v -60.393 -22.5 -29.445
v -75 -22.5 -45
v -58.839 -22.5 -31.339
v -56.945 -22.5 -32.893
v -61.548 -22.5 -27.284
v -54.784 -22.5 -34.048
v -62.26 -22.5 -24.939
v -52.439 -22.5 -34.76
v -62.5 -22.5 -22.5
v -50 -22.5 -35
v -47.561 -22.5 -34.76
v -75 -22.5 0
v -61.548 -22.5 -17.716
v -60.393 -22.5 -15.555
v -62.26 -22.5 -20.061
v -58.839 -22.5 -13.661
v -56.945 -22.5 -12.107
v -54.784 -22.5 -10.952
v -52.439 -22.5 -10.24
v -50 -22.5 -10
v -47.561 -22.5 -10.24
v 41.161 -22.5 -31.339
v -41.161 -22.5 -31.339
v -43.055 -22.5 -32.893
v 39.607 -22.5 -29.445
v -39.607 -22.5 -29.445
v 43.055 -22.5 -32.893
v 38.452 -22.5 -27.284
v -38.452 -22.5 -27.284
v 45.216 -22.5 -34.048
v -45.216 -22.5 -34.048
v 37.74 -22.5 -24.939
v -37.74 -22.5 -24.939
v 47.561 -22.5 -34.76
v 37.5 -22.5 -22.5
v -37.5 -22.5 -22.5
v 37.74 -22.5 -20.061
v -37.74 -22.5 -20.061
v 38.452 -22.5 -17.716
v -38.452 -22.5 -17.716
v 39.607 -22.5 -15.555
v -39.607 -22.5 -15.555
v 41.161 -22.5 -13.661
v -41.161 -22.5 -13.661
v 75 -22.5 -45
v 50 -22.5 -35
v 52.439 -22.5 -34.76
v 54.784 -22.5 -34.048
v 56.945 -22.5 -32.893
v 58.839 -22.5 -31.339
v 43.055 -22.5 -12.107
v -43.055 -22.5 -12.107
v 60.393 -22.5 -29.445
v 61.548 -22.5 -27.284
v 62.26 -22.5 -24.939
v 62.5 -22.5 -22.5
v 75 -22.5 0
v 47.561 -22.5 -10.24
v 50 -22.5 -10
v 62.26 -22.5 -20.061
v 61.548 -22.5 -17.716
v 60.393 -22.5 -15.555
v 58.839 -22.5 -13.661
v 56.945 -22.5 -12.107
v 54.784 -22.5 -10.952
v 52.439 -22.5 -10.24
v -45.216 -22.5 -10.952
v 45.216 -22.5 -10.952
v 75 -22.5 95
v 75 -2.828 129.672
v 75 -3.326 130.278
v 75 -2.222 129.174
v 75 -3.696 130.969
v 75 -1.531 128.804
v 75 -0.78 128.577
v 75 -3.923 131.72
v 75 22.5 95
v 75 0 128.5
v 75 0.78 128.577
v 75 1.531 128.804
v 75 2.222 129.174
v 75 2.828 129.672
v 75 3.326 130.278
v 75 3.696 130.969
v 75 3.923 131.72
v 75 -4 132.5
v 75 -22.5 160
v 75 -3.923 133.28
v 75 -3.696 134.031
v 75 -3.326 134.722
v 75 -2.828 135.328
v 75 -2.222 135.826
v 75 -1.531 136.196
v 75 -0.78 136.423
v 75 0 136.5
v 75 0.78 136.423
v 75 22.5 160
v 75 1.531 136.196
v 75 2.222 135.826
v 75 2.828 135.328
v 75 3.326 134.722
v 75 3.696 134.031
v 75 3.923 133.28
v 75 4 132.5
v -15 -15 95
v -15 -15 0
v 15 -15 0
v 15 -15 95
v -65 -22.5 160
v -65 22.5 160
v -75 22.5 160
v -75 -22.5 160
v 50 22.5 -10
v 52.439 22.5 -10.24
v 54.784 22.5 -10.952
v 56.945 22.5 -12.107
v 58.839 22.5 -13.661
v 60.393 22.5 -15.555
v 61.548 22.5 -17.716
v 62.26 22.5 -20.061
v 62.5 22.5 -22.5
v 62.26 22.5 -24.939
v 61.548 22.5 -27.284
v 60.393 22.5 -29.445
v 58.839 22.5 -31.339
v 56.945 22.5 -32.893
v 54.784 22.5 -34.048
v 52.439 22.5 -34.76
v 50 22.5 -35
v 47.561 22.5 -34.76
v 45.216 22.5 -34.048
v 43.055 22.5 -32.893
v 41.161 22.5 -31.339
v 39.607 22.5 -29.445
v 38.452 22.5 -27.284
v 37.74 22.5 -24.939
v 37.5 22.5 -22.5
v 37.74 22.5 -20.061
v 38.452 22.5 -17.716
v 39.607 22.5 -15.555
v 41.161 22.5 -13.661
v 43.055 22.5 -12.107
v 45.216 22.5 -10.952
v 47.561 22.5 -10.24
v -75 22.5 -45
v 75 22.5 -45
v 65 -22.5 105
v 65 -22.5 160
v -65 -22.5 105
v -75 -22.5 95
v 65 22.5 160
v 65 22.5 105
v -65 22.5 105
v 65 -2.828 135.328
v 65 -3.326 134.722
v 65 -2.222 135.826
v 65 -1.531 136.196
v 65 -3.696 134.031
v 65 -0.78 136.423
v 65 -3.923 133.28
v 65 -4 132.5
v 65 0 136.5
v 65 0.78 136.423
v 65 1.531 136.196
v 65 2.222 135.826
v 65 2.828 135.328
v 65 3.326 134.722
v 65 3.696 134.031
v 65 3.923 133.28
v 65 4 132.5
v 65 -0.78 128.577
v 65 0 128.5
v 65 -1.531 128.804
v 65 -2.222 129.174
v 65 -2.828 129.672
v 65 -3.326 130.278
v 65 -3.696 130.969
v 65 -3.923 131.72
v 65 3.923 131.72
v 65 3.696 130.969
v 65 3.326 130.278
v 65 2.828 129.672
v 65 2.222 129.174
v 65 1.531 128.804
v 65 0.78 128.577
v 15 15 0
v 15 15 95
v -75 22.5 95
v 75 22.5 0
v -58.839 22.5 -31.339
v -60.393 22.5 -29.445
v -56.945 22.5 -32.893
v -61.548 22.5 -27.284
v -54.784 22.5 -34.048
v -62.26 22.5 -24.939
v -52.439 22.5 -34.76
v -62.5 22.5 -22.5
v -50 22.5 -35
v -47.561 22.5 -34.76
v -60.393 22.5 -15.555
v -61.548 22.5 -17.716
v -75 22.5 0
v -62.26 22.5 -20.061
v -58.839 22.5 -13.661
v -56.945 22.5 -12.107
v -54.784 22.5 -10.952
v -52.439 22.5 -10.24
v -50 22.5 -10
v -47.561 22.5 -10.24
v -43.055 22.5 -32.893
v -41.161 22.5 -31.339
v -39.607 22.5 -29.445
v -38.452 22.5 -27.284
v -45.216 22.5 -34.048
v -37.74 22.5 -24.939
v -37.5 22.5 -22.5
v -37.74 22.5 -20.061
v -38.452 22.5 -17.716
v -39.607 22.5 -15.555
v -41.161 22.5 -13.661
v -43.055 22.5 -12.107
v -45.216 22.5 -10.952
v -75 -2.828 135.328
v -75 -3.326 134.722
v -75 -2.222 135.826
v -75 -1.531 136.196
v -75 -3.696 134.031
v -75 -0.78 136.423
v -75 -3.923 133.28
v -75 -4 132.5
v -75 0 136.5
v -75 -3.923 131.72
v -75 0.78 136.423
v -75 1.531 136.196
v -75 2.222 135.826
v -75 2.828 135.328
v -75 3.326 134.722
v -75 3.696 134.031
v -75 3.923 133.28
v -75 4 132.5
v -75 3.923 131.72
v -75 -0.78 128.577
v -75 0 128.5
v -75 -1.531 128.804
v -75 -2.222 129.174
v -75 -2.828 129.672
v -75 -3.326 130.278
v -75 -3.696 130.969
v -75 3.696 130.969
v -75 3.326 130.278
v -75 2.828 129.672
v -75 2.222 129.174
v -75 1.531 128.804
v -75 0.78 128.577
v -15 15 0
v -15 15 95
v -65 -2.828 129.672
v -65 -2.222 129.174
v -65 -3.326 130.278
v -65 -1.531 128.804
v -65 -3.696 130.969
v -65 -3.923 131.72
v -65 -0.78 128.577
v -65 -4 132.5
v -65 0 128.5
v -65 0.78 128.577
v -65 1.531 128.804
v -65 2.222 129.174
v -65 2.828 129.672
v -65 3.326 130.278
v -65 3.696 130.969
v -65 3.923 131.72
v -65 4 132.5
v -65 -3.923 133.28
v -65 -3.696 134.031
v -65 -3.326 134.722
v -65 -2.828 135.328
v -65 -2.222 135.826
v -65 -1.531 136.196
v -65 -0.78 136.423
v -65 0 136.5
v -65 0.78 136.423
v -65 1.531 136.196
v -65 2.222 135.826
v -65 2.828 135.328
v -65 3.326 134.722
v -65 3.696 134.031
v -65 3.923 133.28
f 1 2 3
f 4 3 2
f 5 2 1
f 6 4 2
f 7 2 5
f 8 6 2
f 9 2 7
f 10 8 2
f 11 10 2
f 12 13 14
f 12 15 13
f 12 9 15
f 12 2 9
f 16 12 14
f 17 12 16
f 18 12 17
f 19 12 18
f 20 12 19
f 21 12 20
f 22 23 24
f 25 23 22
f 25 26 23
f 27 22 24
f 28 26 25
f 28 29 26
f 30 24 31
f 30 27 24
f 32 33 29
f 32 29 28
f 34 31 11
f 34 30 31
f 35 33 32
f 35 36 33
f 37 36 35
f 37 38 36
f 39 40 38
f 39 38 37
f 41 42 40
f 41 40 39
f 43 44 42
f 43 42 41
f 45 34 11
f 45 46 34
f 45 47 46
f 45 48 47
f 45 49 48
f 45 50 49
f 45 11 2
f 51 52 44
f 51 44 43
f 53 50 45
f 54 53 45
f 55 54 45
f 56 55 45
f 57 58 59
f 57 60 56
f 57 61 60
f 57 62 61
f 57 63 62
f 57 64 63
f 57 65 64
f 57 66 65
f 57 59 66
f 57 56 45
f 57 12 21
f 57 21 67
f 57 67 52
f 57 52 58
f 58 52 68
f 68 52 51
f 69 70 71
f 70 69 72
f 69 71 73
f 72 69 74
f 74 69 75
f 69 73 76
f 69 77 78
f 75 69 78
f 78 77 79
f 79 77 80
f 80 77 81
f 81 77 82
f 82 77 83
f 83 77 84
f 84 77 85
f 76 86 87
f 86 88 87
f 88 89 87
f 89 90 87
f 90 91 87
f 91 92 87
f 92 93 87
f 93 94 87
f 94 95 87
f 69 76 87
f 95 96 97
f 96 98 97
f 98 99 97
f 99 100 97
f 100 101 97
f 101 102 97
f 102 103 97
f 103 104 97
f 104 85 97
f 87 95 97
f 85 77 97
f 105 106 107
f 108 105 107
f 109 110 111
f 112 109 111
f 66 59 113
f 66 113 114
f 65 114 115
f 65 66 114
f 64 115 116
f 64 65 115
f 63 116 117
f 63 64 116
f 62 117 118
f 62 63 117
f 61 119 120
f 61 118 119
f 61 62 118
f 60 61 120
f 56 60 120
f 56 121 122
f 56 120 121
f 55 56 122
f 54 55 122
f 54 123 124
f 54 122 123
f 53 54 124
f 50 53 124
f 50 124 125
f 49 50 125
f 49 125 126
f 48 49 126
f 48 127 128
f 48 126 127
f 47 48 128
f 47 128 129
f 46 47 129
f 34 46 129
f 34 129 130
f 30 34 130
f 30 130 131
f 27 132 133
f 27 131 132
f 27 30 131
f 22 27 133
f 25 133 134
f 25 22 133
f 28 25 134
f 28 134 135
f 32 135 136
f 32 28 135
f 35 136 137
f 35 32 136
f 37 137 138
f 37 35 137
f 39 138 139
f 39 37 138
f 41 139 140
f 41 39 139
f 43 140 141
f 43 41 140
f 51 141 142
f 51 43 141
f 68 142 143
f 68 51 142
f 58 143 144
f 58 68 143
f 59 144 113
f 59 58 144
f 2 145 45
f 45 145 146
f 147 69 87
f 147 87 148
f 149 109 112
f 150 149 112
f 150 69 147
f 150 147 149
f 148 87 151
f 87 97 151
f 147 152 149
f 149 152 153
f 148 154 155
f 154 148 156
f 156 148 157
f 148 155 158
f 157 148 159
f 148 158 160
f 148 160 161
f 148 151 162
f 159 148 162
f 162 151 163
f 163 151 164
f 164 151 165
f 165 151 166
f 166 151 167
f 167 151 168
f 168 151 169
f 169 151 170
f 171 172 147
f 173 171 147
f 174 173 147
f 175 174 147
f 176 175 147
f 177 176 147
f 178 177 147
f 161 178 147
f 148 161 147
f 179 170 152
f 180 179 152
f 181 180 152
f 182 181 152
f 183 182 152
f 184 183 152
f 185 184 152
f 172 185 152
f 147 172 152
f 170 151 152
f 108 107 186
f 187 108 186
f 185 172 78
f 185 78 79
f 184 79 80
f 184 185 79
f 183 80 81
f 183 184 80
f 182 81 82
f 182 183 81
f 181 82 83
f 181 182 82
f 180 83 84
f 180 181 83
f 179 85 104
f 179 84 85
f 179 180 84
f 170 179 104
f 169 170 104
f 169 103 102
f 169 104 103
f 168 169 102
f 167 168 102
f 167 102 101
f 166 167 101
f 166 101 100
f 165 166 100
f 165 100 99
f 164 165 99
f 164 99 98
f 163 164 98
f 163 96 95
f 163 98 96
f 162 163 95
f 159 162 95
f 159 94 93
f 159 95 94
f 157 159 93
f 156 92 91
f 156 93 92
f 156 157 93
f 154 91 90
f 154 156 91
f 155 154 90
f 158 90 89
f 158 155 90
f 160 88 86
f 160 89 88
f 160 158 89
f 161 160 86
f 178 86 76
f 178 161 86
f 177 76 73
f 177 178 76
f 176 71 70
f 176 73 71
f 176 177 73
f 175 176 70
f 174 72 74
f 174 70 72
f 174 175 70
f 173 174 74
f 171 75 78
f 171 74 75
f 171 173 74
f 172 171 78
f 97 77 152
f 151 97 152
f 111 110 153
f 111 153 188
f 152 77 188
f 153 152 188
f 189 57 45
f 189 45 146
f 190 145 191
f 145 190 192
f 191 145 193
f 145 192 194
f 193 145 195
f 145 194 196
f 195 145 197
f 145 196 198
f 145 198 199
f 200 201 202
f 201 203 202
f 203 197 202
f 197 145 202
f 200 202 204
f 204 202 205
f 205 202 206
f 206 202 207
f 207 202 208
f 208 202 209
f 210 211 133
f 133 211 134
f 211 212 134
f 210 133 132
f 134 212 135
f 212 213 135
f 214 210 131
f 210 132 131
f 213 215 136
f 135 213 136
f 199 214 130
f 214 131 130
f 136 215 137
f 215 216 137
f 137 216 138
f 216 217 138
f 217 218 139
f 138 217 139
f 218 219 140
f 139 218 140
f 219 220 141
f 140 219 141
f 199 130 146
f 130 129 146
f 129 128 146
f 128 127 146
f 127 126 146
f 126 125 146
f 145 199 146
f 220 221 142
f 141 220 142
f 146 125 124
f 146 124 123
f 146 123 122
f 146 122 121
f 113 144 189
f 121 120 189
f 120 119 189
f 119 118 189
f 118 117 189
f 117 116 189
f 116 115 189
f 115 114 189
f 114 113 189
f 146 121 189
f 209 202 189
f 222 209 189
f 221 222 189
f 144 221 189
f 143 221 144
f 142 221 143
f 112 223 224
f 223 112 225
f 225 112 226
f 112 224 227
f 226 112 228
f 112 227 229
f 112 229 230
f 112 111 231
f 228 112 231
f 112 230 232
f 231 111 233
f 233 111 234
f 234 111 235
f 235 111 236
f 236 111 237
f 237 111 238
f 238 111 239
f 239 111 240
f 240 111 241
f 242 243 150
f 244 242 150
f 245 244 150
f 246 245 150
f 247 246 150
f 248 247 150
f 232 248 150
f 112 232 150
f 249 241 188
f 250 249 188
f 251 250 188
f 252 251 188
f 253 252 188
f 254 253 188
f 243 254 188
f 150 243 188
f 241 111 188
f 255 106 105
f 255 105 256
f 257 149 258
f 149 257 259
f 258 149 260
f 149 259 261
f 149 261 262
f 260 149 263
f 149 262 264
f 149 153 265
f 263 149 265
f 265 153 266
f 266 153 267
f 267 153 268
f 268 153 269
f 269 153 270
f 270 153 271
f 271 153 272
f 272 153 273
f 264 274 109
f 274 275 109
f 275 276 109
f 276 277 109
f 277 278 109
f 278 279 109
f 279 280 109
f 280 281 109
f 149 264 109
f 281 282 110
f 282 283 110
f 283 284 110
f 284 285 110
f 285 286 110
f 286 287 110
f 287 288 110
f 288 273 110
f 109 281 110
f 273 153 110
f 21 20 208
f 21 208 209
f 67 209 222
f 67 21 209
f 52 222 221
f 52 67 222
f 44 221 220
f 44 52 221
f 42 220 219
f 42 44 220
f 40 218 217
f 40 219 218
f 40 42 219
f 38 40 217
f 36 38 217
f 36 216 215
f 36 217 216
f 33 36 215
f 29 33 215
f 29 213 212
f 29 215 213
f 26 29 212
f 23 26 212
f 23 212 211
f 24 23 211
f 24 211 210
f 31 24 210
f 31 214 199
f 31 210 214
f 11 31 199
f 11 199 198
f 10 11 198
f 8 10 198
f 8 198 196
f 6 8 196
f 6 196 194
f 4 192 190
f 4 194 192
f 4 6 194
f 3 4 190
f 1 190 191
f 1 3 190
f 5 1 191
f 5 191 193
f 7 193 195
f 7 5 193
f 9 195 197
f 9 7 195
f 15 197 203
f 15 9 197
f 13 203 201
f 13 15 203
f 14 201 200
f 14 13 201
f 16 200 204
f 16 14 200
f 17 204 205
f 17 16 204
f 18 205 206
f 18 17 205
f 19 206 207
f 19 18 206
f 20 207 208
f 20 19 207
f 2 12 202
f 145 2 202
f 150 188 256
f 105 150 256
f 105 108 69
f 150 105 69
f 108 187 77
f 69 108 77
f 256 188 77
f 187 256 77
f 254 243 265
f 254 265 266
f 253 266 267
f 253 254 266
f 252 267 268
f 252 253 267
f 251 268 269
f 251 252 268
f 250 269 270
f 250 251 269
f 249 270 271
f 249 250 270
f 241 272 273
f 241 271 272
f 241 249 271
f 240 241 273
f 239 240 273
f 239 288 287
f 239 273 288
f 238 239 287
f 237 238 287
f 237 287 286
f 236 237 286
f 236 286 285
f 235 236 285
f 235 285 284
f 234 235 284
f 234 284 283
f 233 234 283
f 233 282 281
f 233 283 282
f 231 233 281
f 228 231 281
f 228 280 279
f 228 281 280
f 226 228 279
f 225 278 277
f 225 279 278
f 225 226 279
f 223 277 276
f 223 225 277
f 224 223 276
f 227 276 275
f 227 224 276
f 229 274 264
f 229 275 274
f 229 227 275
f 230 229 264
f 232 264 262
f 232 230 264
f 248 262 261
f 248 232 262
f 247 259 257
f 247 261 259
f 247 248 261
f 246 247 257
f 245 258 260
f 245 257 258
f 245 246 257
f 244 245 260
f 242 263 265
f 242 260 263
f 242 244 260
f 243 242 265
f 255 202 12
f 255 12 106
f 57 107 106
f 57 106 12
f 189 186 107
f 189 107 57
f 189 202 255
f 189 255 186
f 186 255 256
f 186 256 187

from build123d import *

# Parameters (mm, degrees)
SKETCH_1_W               = 150
SKETCH_1_H               = 45
EXTRUDE_1_DEPTH          = 45
CUT_EXTRUDE_1_DEPTH      = 91.311959341
CUT_EXTRUDE_1_DEPTH_BACK = 91.311959341
SKETCH_2_R               = 12.5
SKETCH_3_W               = 30
SKETCH_3_H               = 30
EXTRUDE_2_DEPTH          = 95
EXTRUDE_3_DEPTH          = 22.5
CUT_EXTRUDE_2_DEPTH      = 179.132675273
CUT_EXTRUDE_2_DEPTH_BACK = 179.132675273
SKETCH_5_R               = 4


with BuildPart() as part:
    # 草图1 → 凸台-拉伸1 (new body)
    with BuildSketch(Plane.XY):
        Rectangle(SKETCH_1_W, SKETCH_1_H)
    extrude(amount=-EXTRUDE_1_DEPTH)

    # 草图2 → 切除-拉伸1 (cut, two sides: drawn at the far end of the back side and taken through both)
    with BuildSketch(Plane(origin=(0, 0, 0), x_dir=(1, 0, 0), z_dir=(0, 1, 0)).offset(-CUT_EXTRUDE_1_DEPTH_BACK)):
        with Locations(Location((-50, 22.5, 0), (0, 0, 270))):
            Circle(SKETCH_2_R)
        with Locations(Location((50, 22.5, 0), (0, 0, 270))):
            Circle(SKETCH_2_R)
    extrude(amount=CUT_EXTRUDE_1_DEPTH + CUT_EXTRUDE_1_DEPTH_BACK, mode=Mode.SUBTRACT)

    # 草图3 → 凸台-拉伸2 (add)
    with BuildSketch(Plane.XY):
        Rectangle(SKETCH_3_W, SKETCH_3_H)
    extrude(amount=EXTRUDE_2_DEPTH)

    # 草图4 → 凸台-拉伸3 (add, symmetric)
    with BuildSketch(Plane(origin=(0, 0, 0), x_dir=(1, 0, 0), z_dir=(0, 1, 0))):
        Polygon((-75, -95), (75, -95), (75, -160), (65, -160), (65, -105), (-65, -105), (-65, -160), (-75, -160), align=None)
    extrude(amount=EXTRUDE_3_DEPTH, both=True)

    # 草图5 → 切除-拉伸2 (cut, two sides: drawn at the far end of the back side and taken through both)
    with BuildSketch(Plane(origin=(0, 0, 0), x_dir=(0, 0, -1), z_dir=(1, 0, 0)).offset(-CUT_EXTRUDE_2_DEPTH_BACK)):
        with Locations((-132.5, 0)):
            Circle(SKETCH_5_R)
    extrude(amount=CUT_EXTRUDE_2_DEPTH + CUT_EXTRUDE_2_DEPTH_BACK, mode=Mode.SUBTRACT)


solid = part.part
